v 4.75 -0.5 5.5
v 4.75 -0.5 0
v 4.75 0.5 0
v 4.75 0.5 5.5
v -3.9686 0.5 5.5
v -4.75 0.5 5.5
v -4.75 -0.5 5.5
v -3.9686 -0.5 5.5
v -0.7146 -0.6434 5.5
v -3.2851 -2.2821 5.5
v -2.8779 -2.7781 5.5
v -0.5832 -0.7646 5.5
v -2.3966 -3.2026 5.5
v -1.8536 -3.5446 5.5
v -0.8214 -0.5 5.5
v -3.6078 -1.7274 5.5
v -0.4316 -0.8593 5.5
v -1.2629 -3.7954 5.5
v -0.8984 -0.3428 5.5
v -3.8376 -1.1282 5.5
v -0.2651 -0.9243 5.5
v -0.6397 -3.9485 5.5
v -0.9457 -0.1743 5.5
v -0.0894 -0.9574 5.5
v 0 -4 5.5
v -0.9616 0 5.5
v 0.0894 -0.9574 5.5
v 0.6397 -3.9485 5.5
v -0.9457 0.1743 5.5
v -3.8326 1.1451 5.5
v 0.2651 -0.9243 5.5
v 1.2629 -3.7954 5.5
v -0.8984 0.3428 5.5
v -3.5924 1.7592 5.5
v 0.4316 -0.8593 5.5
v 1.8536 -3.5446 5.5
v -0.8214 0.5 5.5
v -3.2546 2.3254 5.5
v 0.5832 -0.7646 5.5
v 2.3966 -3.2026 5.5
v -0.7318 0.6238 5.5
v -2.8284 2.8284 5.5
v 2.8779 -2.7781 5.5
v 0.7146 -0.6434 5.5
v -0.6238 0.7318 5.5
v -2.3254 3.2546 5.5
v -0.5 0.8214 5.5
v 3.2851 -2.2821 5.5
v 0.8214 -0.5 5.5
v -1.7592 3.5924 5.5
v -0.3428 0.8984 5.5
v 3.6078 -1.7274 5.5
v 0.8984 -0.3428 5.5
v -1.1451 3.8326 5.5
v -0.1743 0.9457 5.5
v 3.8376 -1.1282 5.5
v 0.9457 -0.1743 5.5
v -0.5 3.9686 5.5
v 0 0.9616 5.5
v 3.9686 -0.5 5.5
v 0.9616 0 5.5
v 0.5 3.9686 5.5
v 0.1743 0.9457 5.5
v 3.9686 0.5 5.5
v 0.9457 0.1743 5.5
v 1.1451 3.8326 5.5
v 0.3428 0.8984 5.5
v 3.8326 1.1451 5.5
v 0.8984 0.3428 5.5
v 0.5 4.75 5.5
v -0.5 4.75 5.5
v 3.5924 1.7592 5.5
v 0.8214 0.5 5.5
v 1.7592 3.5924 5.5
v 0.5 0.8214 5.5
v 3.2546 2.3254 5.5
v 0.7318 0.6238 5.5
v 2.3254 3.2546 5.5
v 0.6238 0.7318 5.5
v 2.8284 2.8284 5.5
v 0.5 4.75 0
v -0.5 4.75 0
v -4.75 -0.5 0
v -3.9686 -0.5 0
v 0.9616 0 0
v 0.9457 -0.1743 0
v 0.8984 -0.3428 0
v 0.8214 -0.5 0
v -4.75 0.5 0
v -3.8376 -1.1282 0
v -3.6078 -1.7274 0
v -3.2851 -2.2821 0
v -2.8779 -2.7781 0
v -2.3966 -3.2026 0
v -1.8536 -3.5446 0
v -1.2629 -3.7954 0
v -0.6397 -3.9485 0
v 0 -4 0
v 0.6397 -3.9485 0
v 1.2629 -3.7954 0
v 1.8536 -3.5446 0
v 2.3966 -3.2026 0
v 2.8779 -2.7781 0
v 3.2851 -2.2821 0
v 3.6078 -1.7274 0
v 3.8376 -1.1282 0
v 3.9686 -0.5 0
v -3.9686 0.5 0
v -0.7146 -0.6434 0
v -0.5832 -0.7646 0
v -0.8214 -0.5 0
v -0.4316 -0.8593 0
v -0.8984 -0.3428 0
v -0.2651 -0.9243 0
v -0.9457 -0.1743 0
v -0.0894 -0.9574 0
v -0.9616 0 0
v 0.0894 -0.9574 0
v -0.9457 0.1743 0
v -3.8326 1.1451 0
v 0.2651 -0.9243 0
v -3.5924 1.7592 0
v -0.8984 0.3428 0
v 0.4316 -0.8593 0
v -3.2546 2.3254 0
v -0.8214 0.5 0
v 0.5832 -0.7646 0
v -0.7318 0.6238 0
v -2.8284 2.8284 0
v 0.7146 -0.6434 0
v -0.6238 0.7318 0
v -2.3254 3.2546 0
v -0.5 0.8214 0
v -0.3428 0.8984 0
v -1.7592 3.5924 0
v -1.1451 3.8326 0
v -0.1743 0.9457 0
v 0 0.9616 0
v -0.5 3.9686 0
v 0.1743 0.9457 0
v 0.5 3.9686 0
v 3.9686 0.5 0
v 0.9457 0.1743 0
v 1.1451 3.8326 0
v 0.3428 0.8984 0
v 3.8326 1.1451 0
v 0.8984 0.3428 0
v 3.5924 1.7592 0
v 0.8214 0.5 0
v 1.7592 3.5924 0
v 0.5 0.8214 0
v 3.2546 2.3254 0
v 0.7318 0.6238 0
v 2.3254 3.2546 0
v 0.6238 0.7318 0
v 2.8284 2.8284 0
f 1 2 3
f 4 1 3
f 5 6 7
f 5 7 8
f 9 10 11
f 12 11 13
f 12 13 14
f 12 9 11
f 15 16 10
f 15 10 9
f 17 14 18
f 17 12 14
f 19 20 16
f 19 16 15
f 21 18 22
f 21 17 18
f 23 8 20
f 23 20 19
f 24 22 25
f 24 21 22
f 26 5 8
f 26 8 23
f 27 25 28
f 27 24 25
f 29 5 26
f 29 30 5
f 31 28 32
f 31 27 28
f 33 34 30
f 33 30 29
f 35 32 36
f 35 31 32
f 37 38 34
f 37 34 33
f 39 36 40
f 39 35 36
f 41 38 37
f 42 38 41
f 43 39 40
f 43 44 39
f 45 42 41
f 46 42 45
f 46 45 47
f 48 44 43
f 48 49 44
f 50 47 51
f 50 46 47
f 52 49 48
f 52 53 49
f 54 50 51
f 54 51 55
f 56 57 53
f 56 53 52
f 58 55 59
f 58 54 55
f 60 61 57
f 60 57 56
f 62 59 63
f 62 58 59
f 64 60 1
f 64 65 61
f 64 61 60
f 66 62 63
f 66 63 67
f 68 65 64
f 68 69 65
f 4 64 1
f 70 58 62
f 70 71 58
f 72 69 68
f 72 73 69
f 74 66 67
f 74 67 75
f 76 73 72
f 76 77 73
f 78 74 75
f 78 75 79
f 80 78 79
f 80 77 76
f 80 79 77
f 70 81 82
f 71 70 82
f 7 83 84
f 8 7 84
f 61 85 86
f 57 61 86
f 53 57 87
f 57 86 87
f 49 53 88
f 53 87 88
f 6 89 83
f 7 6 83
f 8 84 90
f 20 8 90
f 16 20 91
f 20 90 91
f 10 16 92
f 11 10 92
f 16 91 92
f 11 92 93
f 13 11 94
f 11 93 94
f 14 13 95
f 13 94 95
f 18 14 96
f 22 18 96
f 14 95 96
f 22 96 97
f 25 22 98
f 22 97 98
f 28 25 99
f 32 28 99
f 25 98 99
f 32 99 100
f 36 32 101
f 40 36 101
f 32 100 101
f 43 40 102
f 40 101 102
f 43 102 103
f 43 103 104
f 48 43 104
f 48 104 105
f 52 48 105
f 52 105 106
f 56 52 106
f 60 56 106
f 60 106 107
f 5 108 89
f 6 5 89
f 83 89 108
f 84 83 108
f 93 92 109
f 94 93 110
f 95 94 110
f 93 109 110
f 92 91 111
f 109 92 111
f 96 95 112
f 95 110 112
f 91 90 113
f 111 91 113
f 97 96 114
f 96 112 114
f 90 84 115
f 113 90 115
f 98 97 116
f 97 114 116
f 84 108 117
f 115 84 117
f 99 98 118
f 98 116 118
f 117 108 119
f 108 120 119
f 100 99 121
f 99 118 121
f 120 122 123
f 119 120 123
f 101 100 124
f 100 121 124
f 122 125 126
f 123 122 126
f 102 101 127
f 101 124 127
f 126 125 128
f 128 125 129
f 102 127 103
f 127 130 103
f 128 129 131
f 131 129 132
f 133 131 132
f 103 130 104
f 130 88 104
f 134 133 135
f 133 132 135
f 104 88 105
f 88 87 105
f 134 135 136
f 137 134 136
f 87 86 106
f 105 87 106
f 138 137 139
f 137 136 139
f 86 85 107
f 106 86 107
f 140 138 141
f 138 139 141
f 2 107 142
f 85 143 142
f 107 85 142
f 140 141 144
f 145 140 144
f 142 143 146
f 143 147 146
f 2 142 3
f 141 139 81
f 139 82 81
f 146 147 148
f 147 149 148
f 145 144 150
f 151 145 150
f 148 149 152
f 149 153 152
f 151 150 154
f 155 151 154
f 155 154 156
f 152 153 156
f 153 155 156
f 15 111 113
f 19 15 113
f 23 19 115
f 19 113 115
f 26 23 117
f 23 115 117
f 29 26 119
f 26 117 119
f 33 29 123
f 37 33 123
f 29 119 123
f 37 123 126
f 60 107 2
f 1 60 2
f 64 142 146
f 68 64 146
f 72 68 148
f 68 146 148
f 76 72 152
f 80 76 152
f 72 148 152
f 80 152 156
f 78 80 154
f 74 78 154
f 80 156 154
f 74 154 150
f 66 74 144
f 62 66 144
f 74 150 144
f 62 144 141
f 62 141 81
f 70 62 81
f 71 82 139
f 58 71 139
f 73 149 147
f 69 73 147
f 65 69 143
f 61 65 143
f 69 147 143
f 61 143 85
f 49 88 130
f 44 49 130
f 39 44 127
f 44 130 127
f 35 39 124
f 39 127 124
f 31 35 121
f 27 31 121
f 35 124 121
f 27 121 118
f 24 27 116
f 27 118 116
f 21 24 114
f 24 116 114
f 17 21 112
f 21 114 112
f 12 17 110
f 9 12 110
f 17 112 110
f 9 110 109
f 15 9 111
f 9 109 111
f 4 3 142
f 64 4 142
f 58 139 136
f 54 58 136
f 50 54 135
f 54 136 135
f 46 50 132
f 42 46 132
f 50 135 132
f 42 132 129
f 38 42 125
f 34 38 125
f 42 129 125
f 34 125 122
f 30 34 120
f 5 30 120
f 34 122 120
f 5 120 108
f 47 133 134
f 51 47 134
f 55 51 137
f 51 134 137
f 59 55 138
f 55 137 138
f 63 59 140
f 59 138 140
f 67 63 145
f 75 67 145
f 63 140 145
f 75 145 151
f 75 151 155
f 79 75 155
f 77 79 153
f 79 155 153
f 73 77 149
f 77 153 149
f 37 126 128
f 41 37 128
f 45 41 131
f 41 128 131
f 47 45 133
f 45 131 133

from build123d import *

# Parameters (mm, degrees)
BOSS_EXTRUDE1_DEPTH = 5.5


with BuildPart() as part:
    # Sketch1 → Boss-Extrude1 (new body)
    with BuildSketch(Plane.XY):
        with BuildLine():
            Line((-0.821374058, -0.5), (-3.968626967, -0.5))
            ThreePointArc((-3.968626967, -0.5), (0, -4), (3.968626967, -0.5))
            Line((3.968626967, -0.5), (0.821374058, -0.5))
            ThreePointArc((0.821374058, -0.5), (0, -0.961590008), (-0.821374058, -0.5))
        make_face()
        with BuildLine():
            ThreePointArc((-0.5, 3.968626967), (-2.828427125, 2.828427125), (-3.968626967, 0.5))
            Line((-3.968626967, 0.5), (-0.821374058, 0.5))
            ThreePointArc((-0.821374058, 0.5), (-0.679946815, 0.679946815), (-0.5, 0.821374058))
            Line((-0.5, 0.821374058), (-0.5, 3.968626967))
        make_face()
        with BuildLine():
            ThreePointArc((3.968626967, 0.5), (2.828427125, 2.828427125), (0.5, 3.968626967))
            Line((0.5, 3.968626967), (0.5, 0.821374058))
            ThreePointArc((0.5, 0.821374058), (0.679946815, 0.679946815), (0.821374058, 0.5))
            Line((0.821374058, 0.5), (3.968626967, 0.5))
        make_face()
        with BuildLine():
            Line((-0.821374058, 0.5), (-3.968626967, 0.5))
            ThreePointArc((-3.968626967, 0.5), (-4, 0), (-3.968626967, -0.5))
            Line((-3.968626967, -0.5), (-0.821374058, -0.5))
            ThreePointArc((-0.821374058, -0.5), (-0.961590008, 0), (-0.821374058, 0.5))
        make_face()
        with BuildLine():
            Line((0.821374058, -0.5), (3.968626967, -0.5))
            ThreePointArc((3.968626967, -0.5), (3.992149037, -0.25049165), (4, 0))
            ThreePointArc((4, 0), (3.992149037, 0.25049165), (3.968626967, 0.5))
            Line((3.968626967, 0.5), (0.821374058, 0.5))
            ThreePointArc((0.821374058, 0.5), (0.925872678, 0.259644234), (0.961590008, 0))
            ThreePointArc((0.961590008, 0), (0.925872678, -0.259644234), (0.821374058, -0.5))
        make_face()
        with BuildLine():
            ThreePointArc((0.5, 3.968626967), (0, 4), (-0.5, 3.968626967))
            Line((-0.5, 3.968626967), (-0.5, 0.821374058))
            ThreePointArc((-0.5, 0.821374058), (0, 0.961590008), (0.5, 0.821374058))
            Line((0.5, 0.821374058), (0.5, 3.968626967))
        make_face()
        with BuildLine():
            Line((-3.968626967, 0.5), (-4.75, 0.5))
            Line((-4.75, 0.5), (-4.75, -0.5))
            Line((-4.75, -0.5), (-3.968626967, -0.5))
            ThreePointArc((-3.968626967, -0.5), (-4, 0), (-3.968626967, 0.5))
        make_face()
        with BuildLine():
            ThreePointArc((4, 0), (3.992149037, -0.25049165), (3.968626967, -0.5))
            Line((3.968626967, -0.5), (4.75, -0.5))
            Line((4.75, -0.5), (4.75, 0.5))
            Line((4.75, 0.5), (3.968626967, 0.5))
            ThreePointArc((3.968626967, 0.5), (3.992149037, 0.25049165), (4, 0))
        make_face()
        with BuildLine():
            Line((-0.5, 4.75), (-0.5, 3.968626967))
            ThreePointArc((-0.5, 3.968626967), (0, 4), (0.5, 3.968626967))
            Line((0.5, 3.968626967), (0.5, 4.75))
            Line((0.5, 4.75), (-0.5, 4.75))
        make_face()
    extrude(amount=BOSS_EXTRUDE1_DEPTH)


solid = part.part
